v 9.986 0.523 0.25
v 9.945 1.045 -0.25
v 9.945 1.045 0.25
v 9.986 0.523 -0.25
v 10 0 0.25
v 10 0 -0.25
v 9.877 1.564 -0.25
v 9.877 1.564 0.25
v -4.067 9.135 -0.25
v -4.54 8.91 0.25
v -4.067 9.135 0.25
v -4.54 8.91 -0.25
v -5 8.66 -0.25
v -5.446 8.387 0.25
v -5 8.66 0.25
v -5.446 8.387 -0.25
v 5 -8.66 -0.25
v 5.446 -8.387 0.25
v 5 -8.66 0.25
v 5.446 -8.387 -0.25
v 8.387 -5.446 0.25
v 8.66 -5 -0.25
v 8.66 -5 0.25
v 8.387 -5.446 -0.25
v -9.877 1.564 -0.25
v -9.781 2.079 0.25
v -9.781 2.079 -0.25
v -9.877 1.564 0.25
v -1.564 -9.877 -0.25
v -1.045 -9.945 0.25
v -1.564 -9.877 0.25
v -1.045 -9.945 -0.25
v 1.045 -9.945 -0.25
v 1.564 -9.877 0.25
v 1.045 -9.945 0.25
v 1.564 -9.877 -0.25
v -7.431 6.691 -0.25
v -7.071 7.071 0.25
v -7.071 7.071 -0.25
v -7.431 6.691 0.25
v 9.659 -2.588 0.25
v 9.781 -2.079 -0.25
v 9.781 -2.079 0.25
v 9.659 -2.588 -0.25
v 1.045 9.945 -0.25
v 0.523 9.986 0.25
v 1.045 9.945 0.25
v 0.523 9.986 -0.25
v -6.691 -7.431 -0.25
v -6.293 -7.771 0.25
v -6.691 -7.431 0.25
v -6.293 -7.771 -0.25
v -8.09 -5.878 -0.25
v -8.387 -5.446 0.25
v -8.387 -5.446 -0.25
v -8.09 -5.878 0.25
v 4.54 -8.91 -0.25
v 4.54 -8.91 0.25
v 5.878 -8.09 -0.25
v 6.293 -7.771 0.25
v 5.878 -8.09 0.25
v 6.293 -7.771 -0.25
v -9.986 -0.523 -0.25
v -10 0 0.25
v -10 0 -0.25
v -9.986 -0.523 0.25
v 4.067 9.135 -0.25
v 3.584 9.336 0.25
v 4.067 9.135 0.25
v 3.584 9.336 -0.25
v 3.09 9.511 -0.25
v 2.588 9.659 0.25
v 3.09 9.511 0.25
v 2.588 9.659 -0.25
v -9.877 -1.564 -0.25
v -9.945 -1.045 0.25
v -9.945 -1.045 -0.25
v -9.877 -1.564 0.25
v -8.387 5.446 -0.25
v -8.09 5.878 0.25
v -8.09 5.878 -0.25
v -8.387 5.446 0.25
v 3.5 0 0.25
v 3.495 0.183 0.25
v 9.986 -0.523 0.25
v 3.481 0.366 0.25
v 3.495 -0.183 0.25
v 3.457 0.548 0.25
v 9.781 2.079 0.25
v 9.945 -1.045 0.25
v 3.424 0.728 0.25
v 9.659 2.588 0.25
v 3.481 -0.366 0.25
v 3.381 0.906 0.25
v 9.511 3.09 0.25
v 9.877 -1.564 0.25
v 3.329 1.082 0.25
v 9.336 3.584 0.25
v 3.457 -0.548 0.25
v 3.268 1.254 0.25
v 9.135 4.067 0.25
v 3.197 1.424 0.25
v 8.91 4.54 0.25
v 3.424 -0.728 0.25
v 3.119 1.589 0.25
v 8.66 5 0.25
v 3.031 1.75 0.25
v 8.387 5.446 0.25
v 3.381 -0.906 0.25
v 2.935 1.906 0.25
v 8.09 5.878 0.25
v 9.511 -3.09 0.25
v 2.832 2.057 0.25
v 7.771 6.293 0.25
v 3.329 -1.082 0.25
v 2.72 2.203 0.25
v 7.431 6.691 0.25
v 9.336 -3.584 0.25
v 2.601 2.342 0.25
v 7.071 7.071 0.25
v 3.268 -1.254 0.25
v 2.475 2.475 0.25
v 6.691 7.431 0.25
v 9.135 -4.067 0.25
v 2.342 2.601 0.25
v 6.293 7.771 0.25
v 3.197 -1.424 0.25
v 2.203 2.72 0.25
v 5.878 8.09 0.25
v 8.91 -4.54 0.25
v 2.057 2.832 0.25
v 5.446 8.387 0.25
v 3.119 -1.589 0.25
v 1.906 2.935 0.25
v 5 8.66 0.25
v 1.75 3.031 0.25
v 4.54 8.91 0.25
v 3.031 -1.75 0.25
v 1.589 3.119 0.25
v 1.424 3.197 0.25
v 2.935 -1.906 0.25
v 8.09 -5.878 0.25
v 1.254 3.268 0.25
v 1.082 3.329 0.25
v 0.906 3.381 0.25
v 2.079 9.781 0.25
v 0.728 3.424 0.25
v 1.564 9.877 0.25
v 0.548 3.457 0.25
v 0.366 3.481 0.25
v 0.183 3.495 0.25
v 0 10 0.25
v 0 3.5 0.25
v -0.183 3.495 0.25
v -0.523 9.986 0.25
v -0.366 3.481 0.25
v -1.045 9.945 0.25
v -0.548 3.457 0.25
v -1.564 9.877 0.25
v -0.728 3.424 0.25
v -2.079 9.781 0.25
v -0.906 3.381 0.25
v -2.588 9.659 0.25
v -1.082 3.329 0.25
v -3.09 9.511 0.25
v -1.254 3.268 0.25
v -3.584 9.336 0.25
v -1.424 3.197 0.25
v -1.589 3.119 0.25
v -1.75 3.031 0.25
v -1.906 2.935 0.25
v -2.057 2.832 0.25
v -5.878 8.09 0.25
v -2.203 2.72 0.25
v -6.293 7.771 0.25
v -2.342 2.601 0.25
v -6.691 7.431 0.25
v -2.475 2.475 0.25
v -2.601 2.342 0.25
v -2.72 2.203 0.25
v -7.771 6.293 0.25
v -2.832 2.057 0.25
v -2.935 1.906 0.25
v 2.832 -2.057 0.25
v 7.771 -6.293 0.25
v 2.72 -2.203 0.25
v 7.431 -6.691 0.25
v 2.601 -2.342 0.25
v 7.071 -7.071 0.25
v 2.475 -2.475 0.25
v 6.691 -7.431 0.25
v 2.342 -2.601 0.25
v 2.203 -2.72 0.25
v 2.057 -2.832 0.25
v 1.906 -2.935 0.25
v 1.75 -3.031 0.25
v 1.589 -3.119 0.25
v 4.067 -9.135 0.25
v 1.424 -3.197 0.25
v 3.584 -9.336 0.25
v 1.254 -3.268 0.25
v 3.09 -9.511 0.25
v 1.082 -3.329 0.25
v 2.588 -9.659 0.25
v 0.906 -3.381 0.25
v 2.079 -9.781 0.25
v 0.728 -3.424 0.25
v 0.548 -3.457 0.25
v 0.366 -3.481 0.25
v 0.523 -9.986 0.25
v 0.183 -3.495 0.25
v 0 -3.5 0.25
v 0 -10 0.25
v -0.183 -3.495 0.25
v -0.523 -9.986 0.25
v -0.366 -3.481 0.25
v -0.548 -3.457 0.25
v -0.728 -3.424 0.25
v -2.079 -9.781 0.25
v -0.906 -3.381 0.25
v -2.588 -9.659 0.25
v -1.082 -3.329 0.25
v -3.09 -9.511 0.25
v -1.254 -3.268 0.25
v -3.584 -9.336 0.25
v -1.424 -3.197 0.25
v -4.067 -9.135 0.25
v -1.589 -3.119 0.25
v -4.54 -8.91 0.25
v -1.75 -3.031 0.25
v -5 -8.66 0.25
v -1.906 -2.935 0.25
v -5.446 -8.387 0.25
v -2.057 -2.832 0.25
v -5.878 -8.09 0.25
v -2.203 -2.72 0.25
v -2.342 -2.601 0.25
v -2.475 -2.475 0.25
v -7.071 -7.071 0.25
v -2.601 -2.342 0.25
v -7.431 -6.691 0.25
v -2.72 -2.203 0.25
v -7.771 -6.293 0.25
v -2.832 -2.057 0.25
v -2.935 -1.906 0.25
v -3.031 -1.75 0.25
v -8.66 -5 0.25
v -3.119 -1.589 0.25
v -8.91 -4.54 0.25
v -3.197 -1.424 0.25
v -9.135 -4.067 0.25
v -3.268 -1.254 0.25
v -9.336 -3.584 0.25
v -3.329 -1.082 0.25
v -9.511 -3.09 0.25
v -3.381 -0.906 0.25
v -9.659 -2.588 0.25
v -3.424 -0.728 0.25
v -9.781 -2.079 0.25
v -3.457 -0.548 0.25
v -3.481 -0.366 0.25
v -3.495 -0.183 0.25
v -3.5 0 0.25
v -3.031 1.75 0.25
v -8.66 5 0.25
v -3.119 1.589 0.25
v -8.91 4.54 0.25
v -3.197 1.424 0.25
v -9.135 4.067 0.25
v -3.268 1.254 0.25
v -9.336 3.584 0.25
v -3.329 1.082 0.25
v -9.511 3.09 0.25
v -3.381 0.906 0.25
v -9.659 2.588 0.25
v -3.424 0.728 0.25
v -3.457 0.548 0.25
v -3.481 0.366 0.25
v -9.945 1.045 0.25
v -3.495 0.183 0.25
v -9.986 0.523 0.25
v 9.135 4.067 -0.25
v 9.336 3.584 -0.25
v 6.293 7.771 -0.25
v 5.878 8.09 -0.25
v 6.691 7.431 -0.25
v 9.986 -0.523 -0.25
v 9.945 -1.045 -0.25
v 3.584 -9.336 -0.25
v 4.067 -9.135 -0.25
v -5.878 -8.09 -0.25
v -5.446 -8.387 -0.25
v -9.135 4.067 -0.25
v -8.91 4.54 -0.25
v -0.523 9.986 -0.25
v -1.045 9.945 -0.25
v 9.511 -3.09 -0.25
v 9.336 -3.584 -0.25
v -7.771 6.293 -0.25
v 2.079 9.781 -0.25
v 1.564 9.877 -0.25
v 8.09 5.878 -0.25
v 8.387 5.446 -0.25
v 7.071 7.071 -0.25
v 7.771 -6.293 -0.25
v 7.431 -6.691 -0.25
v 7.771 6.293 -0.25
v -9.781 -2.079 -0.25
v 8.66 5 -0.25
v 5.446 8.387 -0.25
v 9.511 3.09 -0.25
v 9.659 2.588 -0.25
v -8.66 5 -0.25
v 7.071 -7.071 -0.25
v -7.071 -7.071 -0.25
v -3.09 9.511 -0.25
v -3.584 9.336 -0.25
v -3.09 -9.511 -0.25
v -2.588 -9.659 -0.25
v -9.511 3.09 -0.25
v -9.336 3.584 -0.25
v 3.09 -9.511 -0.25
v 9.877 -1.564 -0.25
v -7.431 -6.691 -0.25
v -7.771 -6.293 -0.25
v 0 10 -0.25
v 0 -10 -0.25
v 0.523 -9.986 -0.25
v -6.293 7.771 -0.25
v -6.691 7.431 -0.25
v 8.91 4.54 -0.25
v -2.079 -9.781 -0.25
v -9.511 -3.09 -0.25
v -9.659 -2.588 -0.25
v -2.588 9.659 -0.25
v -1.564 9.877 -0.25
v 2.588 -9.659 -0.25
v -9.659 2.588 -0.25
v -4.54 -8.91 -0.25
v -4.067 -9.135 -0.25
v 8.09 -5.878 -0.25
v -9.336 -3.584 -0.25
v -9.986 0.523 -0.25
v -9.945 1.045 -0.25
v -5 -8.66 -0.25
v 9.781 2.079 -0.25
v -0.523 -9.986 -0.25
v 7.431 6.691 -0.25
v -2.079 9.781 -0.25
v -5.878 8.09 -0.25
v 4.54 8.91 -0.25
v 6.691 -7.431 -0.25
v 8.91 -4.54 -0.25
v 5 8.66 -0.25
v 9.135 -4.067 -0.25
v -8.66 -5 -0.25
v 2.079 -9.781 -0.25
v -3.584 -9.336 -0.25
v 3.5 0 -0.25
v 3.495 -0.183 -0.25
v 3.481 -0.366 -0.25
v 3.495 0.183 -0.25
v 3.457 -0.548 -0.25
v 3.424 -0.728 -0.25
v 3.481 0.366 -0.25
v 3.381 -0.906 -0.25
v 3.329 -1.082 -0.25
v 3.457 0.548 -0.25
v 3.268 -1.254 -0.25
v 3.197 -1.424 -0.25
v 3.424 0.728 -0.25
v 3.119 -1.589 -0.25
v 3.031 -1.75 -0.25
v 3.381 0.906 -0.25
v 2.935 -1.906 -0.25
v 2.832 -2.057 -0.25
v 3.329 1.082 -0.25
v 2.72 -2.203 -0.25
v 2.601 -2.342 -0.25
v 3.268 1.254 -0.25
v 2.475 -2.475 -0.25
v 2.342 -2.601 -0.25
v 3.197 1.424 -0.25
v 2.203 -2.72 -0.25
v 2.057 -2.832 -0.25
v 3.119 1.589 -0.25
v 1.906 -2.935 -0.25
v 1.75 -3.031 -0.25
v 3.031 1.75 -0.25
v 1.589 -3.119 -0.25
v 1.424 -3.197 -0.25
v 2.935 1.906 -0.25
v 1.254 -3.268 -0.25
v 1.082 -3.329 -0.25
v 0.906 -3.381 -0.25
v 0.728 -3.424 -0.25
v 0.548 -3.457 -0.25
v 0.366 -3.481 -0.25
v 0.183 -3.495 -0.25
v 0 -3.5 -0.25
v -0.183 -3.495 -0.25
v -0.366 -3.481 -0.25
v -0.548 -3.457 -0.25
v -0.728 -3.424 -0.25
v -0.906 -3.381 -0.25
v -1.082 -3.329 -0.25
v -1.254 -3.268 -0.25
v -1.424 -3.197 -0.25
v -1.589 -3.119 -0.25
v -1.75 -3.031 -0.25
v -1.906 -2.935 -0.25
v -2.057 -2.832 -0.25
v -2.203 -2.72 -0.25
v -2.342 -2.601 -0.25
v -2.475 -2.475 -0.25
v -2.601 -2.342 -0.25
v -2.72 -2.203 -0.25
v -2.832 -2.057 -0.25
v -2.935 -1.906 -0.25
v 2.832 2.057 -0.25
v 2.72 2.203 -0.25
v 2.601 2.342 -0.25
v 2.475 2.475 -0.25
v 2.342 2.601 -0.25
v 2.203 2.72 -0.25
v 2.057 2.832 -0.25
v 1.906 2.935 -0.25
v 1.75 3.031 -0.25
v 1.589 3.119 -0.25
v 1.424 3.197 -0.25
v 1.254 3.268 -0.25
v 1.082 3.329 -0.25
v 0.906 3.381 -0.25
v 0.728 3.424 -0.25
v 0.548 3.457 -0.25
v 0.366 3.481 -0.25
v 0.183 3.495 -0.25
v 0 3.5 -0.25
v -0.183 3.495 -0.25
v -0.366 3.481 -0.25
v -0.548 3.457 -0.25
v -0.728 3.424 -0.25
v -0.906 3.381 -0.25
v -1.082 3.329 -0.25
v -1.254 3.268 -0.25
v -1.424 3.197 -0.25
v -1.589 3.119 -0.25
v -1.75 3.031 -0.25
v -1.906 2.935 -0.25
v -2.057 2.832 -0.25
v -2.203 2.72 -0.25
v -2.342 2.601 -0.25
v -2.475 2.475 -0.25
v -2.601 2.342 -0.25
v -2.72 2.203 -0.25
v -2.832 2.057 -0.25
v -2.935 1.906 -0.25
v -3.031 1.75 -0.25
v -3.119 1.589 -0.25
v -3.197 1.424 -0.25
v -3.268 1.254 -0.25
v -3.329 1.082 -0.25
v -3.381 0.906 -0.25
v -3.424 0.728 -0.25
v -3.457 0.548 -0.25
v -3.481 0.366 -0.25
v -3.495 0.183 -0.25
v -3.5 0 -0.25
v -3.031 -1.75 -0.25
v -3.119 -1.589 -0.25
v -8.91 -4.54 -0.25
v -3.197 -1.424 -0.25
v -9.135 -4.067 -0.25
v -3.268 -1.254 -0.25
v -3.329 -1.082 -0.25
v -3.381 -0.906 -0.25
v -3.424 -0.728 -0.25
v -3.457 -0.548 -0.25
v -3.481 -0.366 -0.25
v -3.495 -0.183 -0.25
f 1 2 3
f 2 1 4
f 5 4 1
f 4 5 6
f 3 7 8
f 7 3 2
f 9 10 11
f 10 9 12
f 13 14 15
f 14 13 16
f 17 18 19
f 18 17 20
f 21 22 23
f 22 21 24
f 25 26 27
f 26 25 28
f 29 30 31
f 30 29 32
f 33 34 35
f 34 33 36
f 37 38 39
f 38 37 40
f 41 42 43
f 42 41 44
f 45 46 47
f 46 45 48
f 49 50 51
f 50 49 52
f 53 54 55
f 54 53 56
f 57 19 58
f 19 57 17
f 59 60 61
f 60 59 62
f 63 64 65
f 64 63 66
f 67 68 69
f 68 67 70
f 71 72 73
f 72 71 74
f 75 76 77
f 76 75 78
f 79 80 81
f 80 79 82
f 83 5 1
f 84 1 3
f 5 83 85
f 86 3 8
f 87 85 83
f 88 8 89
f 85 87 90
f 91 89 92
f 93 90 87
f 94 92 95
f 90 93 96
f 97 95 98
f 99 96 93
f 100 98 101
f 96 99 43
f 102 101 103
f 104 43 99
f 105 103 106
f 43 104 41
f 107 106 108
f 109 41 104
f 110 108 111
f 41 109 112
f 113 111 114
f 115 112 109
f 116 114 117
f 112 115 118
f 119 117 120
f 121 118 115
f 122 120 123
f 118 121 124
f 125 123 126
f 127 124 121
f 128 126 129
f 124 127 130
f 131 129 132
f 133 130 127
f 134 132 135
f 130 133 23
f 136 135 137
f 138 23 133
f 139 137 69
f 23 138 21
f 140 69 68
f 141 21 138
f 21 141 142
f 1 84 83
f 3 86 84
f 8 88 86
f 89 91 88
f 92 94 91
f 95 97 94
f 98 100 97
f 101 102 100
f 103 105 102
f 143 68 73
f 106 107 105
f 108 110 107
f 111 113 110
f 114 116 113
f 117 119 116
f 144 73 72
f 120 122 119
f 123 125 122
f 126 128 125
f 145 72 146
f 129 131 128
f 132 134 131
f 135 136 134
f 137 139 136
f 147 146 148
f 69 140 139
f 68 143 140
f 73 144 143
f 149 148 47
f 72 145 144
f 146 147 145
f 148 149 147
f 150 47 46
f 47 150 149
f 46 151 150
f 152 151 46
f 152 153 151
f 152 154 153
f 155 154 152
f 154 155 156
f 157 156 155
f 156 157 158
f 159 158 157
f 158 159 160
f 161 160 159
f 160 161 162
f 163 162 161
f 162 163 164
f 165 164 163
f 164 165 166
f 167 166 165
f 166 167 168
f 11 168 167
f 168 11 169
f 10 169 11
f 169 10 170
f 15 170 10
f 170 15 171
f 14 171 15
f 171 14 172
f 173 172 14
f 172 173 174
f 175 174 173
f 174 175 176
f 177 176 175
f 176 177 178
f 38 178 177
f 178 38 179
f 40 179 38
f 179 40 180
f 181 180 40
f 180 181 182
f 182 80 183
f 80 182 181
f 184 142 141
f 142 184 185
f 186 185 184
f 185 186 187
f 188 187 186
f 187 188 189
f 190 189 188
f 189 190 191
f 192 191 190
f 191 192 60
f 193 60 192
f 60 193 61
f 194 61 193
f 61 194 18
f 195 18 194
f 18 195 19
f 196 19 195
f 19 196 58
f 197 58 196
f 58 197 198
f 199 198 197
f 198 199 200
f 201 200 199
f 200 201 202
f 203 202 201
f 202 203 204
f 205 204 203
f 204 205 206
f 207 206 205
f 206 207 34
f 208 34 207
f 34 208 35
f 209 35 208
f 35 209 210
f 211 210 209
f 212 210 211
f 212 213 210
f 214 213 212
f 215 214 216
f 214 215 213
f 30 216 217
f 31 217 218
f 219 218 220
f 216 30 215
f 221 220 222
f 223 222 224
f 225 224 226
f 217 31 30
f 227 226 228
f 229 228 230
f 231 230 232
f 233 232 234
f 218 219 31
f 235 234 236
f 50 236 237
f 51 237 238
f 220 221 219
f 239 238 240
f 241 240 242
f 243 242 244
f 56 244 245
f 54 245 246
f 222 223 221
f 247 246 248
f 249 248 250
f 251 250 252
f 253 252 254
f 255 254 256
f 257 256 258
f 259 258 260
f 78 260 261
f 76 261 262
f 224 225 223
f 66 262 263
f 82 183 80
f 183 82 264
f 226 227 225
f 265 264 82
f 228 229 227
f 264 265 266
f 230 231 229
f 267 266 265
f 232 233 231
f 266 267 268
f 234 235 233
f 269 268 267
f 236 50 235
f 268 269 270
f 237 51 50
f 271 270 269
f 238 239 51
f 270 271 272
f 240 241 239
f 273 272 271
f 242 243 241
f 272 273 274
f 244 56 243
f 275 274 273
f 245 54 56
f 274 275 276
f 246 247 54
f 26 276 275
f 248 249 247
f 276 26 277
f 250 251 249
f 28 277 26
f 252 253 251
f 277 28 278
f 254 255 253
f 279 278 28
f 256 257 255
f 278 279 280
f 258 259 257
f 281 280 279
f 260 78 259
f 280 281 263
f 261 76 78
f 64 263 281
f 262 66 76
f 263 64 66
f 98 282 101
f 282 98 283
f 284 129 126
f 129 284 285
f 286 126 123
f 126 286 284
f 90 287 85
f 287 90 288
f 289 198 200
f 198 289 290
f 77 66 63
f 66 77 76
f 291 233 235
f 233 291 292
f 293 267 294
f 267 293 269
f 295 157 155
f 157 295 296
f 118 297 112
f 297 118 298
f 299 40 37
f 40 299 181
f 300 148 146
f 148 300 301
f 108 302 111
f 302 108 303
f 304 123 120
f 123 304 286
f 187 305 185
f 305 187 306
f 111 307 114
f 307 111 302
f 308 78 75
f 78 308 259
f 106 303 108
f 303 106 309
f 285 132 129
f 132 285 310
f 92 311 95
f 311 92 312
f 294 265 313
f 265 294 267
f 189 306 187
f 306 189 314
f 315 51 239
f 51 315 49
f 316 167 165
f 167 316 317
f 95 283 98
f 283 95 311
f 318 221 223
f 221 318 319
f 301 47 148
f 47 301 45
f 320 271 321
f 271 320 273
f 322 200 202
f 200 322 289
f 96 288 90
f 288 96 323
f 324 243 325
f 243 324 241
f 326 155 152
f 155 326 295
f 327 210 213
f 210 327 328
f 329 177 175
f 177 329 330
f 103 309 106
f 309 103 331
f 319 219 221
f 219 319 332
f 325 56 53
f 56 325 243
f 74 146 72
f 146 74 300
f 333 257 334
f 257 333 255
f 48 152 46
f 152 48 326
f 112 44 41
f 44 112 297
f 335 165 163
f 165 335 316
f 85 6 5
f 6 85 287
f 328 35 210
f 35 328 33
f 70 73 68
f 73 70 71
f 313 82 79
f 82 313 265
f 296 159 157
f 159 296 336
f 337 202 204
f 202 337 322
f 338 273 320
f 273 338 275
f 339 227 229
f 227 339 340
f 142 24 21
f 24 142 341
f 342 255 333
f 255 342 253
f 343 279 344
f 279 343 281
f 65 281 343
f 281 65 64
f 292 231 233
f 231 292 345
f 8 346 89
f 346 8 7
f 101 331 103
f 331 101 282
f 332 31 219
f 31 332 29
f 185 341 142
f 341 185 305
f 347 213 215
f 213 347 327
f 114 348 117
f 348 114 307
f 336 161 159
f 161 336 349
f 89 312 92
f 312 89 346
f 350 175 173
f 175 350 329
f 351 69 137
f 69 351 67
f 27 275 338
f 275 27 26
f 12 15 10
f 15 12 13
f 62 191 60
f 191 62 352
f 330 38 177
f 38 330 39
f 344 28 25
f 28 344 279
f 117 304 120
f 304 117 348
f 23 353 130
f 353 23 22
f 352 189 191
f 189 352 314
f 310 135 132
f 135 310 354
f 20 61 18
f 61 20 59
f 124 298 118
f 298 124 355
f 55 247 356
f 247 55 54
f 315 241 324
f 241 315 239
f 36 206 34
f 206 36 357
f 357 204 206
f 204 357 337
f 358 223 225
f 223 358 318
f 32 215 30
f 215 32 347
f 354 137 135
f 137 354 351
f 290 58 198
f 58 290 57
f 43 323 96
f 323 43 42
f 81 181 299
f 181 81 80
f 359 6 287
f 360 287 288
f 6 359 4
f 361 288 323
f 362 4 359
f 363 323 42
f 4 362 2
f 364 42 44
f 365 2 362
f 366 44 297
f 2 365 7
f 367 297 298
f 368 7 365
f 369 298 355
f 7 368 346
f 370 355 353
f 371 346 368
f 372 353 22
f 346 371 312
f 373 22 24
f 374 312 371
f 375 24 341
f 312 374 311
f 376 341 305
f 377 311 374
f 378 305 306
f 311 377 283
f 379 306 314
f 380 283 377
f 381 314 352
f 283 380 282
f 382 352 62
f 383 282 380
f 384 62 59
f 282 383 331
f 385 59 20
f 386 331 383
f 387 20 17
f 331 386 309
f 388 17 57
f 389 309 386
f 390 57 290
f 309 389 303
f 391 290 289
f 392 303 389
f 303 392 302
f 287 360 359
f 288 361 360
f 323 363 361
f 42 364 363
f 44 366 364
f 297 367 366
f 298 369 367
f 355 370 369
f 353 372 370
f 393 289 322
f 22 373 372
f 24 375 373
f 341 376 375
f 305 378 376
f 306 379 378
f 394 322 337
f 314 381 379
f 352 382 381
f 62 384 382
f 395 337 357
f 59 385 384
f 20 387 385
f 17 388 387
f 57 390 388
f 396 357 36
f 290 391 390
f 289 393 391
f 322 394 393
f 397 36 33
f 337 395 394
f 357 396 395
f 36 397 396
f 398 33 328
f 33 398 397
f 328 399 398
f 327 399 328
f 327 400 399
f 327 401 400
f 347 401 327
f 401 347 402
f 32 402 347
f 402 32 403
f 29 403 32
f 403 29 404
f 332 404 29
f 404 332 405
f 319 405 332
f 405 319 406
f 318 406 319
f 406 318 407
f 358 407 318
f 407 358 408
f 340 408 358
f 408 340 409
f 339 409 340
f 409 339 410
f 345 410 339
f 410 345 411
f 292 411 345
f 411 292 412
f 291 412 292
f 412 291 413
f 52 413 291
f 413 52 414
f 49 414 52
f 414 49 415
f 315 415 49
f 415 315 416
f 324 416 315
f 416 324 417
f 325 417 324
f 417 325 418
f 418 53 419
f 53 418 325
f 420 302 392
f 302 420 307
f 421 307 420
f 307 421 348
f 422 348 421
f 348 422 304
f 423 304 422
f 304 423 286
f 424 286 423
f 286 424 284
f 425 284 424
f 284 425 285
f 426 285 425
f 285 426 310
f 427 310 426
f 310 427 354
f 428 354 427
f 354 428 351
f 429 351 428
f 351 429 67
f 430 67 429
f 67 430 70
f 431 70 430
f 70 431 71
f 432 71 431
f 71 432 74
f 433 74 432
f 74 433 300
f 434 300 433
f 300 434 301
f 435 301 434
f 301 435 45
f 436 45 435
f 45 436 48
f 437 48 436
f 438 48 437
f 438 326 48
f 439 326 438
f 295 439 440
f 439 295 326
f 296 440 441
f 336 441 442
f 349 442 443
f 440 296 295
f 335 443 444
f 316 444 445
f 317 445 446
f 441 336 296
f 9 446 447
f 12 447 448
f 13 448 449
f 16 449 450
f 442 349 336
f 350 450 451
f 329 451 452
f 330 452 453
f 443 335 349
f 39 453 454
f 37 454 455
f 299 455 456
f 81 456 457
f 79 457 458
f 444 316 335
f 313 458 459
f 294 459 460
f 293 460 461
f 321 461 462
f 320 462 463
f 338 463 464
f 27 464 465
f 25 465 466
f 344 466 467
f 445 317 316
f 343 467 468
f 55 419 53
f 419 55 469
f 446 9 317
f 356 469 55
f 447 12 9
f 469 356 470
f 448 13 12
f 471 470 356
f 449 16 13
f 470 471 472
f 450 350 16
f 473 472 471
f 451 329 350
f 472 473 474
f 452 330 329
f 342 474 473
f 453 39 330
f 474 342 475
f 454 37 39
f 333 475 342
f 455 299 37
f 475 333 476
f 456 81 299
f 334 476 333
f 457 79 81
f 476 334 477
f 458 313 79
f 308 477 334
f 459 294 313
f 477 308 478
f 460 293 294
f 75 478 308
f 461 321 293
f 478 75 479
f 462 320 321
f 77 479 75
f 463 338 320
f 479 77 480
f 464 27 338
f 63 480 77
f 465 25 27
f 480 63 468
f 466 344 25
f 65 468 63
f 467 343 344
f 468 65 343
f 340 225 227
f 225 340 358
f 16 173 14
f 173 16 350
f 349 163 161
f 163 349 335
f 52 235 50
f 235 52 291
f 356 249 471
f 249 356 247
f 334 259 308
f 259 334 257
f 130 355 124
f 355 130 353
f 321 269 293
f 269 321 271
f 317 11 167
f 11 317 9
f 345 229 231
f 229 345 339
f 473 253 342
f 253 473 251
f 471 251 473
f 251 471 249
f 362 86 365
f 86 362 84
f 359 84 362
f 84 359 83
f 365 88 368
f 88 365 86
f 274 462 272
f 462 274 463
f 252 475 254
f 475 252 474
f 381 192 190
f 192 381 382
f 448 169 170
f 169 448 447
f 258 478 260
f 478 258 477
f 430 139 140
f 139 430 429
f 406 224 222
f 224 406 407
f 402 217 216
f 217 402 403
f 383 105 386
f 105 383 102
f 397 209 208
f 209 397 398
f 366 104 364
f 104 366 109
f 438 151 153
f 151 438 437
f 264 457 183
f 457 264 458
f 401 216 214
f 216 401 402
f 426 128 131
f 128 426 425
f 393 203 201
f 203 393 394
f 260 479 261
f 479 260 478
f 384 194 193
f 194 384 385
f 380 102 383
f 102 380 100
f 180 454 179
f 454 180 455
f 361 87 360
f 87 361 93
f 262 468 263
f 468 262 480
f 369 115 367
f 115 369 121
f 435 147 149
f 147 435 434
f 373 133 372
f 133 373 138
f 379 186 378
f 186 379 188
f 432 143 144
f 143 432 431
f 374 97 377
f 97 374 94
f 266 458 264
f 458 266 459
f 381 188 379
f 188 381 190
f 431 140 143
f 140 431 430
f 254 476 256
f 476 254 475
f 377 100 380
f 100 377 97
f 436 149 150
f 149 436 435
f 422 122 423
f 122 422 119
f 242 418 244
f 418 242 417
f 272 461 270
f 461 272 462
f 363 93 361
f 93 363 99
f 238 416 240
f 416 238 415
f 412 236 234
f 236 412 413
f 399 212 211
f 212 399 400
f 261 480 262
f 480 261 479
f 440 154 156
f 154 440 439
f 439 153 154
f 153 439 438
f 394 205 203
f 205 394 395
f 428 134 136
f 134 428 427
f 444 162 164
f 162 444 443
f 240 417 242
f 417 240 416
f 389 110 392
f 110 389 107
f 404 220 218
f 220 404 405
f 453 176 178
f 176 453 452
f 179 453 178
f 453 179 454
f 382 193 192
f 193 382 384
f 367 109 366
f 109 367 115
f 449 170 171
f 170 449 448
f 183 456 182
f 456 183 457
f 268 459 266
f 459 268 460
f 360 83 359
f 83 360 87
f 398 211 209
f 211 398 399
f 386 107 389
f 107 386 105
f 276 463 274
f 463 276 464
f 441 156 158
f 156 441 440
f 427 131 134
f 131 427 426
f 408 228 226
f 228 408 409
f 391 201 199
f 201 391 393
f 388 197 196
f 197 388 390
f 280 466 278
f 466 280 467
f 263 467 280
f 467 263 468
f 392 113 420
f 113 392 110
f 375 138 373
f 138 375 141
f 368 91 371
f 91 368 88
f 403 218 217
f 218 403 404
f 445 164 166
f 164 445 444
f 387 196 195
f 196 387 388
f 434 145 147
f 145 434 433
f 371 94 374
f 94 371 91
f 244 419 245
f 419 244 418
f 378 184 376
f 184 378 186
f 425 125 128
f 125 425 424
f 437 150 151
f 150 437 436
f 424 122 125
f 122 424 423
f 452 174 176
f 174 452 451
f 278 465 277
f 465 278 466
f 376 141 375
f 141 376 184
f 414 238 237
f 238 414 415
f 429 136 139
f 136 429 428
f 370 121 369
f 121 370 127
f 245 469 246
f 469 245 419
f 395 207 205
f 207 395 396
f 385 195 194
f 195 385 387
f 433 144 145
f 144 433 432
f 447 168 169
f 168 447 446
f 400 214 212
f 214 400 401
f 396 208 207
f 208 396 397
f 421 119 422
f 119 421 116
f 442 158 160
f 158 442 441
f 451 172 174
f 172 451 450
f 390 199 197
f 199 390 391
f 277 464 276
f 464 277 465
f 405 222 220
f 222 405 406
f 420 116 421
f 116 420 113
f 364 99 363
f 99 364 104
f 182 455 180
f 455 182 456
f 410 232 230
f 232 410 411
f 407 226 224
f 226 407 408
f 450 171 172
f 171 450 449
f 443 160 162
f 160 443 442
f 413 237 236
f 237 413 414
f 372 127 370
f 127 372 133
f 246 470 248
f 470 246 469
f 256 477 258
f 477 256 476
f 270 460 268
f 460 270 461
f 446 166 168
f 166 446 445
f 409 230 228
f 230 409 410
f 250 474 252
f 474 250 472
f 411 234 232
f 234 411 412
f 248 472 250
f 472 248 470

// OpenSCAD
/*

By Harlo
 - 29/10/2015
 - Customizable Ring Washer 

*/



/////////////////////////////////////////////
//////////////// VARIABLES
/////////////////////////////////////////////

// Resolution of circle
res = 120; //[32, 64, 120, 200]
// Inner diameter in mm that will be cut out
inner_dia = 7; //[1:0.5:199]
// Outer diameter in mm that will form the main body of the washer
outer_dia = 20; //[10:0.5:200]
// Thickness/Depth in mm of the washer 
thickness = 0.5; //[0.5:0.5:10] 

/////////////////////////////////////////////
//////////////// RENDERS
/////////////////////////////////////////////


final();

/////////////////////////////////////////////
//////////////// MODULES
/////////////////////////////////////////////

module final(){
    difference(){
        outer_circle();
        inner_circle();
    }


}

module outer_circle(){
    
    cylinder (h = thickness, d = outer_dia, center = true, $fn = res);


}

module inner_circle(){
     cylinder (h = thickness+1, d = inner_dia, center = true, $fn = res);


}
